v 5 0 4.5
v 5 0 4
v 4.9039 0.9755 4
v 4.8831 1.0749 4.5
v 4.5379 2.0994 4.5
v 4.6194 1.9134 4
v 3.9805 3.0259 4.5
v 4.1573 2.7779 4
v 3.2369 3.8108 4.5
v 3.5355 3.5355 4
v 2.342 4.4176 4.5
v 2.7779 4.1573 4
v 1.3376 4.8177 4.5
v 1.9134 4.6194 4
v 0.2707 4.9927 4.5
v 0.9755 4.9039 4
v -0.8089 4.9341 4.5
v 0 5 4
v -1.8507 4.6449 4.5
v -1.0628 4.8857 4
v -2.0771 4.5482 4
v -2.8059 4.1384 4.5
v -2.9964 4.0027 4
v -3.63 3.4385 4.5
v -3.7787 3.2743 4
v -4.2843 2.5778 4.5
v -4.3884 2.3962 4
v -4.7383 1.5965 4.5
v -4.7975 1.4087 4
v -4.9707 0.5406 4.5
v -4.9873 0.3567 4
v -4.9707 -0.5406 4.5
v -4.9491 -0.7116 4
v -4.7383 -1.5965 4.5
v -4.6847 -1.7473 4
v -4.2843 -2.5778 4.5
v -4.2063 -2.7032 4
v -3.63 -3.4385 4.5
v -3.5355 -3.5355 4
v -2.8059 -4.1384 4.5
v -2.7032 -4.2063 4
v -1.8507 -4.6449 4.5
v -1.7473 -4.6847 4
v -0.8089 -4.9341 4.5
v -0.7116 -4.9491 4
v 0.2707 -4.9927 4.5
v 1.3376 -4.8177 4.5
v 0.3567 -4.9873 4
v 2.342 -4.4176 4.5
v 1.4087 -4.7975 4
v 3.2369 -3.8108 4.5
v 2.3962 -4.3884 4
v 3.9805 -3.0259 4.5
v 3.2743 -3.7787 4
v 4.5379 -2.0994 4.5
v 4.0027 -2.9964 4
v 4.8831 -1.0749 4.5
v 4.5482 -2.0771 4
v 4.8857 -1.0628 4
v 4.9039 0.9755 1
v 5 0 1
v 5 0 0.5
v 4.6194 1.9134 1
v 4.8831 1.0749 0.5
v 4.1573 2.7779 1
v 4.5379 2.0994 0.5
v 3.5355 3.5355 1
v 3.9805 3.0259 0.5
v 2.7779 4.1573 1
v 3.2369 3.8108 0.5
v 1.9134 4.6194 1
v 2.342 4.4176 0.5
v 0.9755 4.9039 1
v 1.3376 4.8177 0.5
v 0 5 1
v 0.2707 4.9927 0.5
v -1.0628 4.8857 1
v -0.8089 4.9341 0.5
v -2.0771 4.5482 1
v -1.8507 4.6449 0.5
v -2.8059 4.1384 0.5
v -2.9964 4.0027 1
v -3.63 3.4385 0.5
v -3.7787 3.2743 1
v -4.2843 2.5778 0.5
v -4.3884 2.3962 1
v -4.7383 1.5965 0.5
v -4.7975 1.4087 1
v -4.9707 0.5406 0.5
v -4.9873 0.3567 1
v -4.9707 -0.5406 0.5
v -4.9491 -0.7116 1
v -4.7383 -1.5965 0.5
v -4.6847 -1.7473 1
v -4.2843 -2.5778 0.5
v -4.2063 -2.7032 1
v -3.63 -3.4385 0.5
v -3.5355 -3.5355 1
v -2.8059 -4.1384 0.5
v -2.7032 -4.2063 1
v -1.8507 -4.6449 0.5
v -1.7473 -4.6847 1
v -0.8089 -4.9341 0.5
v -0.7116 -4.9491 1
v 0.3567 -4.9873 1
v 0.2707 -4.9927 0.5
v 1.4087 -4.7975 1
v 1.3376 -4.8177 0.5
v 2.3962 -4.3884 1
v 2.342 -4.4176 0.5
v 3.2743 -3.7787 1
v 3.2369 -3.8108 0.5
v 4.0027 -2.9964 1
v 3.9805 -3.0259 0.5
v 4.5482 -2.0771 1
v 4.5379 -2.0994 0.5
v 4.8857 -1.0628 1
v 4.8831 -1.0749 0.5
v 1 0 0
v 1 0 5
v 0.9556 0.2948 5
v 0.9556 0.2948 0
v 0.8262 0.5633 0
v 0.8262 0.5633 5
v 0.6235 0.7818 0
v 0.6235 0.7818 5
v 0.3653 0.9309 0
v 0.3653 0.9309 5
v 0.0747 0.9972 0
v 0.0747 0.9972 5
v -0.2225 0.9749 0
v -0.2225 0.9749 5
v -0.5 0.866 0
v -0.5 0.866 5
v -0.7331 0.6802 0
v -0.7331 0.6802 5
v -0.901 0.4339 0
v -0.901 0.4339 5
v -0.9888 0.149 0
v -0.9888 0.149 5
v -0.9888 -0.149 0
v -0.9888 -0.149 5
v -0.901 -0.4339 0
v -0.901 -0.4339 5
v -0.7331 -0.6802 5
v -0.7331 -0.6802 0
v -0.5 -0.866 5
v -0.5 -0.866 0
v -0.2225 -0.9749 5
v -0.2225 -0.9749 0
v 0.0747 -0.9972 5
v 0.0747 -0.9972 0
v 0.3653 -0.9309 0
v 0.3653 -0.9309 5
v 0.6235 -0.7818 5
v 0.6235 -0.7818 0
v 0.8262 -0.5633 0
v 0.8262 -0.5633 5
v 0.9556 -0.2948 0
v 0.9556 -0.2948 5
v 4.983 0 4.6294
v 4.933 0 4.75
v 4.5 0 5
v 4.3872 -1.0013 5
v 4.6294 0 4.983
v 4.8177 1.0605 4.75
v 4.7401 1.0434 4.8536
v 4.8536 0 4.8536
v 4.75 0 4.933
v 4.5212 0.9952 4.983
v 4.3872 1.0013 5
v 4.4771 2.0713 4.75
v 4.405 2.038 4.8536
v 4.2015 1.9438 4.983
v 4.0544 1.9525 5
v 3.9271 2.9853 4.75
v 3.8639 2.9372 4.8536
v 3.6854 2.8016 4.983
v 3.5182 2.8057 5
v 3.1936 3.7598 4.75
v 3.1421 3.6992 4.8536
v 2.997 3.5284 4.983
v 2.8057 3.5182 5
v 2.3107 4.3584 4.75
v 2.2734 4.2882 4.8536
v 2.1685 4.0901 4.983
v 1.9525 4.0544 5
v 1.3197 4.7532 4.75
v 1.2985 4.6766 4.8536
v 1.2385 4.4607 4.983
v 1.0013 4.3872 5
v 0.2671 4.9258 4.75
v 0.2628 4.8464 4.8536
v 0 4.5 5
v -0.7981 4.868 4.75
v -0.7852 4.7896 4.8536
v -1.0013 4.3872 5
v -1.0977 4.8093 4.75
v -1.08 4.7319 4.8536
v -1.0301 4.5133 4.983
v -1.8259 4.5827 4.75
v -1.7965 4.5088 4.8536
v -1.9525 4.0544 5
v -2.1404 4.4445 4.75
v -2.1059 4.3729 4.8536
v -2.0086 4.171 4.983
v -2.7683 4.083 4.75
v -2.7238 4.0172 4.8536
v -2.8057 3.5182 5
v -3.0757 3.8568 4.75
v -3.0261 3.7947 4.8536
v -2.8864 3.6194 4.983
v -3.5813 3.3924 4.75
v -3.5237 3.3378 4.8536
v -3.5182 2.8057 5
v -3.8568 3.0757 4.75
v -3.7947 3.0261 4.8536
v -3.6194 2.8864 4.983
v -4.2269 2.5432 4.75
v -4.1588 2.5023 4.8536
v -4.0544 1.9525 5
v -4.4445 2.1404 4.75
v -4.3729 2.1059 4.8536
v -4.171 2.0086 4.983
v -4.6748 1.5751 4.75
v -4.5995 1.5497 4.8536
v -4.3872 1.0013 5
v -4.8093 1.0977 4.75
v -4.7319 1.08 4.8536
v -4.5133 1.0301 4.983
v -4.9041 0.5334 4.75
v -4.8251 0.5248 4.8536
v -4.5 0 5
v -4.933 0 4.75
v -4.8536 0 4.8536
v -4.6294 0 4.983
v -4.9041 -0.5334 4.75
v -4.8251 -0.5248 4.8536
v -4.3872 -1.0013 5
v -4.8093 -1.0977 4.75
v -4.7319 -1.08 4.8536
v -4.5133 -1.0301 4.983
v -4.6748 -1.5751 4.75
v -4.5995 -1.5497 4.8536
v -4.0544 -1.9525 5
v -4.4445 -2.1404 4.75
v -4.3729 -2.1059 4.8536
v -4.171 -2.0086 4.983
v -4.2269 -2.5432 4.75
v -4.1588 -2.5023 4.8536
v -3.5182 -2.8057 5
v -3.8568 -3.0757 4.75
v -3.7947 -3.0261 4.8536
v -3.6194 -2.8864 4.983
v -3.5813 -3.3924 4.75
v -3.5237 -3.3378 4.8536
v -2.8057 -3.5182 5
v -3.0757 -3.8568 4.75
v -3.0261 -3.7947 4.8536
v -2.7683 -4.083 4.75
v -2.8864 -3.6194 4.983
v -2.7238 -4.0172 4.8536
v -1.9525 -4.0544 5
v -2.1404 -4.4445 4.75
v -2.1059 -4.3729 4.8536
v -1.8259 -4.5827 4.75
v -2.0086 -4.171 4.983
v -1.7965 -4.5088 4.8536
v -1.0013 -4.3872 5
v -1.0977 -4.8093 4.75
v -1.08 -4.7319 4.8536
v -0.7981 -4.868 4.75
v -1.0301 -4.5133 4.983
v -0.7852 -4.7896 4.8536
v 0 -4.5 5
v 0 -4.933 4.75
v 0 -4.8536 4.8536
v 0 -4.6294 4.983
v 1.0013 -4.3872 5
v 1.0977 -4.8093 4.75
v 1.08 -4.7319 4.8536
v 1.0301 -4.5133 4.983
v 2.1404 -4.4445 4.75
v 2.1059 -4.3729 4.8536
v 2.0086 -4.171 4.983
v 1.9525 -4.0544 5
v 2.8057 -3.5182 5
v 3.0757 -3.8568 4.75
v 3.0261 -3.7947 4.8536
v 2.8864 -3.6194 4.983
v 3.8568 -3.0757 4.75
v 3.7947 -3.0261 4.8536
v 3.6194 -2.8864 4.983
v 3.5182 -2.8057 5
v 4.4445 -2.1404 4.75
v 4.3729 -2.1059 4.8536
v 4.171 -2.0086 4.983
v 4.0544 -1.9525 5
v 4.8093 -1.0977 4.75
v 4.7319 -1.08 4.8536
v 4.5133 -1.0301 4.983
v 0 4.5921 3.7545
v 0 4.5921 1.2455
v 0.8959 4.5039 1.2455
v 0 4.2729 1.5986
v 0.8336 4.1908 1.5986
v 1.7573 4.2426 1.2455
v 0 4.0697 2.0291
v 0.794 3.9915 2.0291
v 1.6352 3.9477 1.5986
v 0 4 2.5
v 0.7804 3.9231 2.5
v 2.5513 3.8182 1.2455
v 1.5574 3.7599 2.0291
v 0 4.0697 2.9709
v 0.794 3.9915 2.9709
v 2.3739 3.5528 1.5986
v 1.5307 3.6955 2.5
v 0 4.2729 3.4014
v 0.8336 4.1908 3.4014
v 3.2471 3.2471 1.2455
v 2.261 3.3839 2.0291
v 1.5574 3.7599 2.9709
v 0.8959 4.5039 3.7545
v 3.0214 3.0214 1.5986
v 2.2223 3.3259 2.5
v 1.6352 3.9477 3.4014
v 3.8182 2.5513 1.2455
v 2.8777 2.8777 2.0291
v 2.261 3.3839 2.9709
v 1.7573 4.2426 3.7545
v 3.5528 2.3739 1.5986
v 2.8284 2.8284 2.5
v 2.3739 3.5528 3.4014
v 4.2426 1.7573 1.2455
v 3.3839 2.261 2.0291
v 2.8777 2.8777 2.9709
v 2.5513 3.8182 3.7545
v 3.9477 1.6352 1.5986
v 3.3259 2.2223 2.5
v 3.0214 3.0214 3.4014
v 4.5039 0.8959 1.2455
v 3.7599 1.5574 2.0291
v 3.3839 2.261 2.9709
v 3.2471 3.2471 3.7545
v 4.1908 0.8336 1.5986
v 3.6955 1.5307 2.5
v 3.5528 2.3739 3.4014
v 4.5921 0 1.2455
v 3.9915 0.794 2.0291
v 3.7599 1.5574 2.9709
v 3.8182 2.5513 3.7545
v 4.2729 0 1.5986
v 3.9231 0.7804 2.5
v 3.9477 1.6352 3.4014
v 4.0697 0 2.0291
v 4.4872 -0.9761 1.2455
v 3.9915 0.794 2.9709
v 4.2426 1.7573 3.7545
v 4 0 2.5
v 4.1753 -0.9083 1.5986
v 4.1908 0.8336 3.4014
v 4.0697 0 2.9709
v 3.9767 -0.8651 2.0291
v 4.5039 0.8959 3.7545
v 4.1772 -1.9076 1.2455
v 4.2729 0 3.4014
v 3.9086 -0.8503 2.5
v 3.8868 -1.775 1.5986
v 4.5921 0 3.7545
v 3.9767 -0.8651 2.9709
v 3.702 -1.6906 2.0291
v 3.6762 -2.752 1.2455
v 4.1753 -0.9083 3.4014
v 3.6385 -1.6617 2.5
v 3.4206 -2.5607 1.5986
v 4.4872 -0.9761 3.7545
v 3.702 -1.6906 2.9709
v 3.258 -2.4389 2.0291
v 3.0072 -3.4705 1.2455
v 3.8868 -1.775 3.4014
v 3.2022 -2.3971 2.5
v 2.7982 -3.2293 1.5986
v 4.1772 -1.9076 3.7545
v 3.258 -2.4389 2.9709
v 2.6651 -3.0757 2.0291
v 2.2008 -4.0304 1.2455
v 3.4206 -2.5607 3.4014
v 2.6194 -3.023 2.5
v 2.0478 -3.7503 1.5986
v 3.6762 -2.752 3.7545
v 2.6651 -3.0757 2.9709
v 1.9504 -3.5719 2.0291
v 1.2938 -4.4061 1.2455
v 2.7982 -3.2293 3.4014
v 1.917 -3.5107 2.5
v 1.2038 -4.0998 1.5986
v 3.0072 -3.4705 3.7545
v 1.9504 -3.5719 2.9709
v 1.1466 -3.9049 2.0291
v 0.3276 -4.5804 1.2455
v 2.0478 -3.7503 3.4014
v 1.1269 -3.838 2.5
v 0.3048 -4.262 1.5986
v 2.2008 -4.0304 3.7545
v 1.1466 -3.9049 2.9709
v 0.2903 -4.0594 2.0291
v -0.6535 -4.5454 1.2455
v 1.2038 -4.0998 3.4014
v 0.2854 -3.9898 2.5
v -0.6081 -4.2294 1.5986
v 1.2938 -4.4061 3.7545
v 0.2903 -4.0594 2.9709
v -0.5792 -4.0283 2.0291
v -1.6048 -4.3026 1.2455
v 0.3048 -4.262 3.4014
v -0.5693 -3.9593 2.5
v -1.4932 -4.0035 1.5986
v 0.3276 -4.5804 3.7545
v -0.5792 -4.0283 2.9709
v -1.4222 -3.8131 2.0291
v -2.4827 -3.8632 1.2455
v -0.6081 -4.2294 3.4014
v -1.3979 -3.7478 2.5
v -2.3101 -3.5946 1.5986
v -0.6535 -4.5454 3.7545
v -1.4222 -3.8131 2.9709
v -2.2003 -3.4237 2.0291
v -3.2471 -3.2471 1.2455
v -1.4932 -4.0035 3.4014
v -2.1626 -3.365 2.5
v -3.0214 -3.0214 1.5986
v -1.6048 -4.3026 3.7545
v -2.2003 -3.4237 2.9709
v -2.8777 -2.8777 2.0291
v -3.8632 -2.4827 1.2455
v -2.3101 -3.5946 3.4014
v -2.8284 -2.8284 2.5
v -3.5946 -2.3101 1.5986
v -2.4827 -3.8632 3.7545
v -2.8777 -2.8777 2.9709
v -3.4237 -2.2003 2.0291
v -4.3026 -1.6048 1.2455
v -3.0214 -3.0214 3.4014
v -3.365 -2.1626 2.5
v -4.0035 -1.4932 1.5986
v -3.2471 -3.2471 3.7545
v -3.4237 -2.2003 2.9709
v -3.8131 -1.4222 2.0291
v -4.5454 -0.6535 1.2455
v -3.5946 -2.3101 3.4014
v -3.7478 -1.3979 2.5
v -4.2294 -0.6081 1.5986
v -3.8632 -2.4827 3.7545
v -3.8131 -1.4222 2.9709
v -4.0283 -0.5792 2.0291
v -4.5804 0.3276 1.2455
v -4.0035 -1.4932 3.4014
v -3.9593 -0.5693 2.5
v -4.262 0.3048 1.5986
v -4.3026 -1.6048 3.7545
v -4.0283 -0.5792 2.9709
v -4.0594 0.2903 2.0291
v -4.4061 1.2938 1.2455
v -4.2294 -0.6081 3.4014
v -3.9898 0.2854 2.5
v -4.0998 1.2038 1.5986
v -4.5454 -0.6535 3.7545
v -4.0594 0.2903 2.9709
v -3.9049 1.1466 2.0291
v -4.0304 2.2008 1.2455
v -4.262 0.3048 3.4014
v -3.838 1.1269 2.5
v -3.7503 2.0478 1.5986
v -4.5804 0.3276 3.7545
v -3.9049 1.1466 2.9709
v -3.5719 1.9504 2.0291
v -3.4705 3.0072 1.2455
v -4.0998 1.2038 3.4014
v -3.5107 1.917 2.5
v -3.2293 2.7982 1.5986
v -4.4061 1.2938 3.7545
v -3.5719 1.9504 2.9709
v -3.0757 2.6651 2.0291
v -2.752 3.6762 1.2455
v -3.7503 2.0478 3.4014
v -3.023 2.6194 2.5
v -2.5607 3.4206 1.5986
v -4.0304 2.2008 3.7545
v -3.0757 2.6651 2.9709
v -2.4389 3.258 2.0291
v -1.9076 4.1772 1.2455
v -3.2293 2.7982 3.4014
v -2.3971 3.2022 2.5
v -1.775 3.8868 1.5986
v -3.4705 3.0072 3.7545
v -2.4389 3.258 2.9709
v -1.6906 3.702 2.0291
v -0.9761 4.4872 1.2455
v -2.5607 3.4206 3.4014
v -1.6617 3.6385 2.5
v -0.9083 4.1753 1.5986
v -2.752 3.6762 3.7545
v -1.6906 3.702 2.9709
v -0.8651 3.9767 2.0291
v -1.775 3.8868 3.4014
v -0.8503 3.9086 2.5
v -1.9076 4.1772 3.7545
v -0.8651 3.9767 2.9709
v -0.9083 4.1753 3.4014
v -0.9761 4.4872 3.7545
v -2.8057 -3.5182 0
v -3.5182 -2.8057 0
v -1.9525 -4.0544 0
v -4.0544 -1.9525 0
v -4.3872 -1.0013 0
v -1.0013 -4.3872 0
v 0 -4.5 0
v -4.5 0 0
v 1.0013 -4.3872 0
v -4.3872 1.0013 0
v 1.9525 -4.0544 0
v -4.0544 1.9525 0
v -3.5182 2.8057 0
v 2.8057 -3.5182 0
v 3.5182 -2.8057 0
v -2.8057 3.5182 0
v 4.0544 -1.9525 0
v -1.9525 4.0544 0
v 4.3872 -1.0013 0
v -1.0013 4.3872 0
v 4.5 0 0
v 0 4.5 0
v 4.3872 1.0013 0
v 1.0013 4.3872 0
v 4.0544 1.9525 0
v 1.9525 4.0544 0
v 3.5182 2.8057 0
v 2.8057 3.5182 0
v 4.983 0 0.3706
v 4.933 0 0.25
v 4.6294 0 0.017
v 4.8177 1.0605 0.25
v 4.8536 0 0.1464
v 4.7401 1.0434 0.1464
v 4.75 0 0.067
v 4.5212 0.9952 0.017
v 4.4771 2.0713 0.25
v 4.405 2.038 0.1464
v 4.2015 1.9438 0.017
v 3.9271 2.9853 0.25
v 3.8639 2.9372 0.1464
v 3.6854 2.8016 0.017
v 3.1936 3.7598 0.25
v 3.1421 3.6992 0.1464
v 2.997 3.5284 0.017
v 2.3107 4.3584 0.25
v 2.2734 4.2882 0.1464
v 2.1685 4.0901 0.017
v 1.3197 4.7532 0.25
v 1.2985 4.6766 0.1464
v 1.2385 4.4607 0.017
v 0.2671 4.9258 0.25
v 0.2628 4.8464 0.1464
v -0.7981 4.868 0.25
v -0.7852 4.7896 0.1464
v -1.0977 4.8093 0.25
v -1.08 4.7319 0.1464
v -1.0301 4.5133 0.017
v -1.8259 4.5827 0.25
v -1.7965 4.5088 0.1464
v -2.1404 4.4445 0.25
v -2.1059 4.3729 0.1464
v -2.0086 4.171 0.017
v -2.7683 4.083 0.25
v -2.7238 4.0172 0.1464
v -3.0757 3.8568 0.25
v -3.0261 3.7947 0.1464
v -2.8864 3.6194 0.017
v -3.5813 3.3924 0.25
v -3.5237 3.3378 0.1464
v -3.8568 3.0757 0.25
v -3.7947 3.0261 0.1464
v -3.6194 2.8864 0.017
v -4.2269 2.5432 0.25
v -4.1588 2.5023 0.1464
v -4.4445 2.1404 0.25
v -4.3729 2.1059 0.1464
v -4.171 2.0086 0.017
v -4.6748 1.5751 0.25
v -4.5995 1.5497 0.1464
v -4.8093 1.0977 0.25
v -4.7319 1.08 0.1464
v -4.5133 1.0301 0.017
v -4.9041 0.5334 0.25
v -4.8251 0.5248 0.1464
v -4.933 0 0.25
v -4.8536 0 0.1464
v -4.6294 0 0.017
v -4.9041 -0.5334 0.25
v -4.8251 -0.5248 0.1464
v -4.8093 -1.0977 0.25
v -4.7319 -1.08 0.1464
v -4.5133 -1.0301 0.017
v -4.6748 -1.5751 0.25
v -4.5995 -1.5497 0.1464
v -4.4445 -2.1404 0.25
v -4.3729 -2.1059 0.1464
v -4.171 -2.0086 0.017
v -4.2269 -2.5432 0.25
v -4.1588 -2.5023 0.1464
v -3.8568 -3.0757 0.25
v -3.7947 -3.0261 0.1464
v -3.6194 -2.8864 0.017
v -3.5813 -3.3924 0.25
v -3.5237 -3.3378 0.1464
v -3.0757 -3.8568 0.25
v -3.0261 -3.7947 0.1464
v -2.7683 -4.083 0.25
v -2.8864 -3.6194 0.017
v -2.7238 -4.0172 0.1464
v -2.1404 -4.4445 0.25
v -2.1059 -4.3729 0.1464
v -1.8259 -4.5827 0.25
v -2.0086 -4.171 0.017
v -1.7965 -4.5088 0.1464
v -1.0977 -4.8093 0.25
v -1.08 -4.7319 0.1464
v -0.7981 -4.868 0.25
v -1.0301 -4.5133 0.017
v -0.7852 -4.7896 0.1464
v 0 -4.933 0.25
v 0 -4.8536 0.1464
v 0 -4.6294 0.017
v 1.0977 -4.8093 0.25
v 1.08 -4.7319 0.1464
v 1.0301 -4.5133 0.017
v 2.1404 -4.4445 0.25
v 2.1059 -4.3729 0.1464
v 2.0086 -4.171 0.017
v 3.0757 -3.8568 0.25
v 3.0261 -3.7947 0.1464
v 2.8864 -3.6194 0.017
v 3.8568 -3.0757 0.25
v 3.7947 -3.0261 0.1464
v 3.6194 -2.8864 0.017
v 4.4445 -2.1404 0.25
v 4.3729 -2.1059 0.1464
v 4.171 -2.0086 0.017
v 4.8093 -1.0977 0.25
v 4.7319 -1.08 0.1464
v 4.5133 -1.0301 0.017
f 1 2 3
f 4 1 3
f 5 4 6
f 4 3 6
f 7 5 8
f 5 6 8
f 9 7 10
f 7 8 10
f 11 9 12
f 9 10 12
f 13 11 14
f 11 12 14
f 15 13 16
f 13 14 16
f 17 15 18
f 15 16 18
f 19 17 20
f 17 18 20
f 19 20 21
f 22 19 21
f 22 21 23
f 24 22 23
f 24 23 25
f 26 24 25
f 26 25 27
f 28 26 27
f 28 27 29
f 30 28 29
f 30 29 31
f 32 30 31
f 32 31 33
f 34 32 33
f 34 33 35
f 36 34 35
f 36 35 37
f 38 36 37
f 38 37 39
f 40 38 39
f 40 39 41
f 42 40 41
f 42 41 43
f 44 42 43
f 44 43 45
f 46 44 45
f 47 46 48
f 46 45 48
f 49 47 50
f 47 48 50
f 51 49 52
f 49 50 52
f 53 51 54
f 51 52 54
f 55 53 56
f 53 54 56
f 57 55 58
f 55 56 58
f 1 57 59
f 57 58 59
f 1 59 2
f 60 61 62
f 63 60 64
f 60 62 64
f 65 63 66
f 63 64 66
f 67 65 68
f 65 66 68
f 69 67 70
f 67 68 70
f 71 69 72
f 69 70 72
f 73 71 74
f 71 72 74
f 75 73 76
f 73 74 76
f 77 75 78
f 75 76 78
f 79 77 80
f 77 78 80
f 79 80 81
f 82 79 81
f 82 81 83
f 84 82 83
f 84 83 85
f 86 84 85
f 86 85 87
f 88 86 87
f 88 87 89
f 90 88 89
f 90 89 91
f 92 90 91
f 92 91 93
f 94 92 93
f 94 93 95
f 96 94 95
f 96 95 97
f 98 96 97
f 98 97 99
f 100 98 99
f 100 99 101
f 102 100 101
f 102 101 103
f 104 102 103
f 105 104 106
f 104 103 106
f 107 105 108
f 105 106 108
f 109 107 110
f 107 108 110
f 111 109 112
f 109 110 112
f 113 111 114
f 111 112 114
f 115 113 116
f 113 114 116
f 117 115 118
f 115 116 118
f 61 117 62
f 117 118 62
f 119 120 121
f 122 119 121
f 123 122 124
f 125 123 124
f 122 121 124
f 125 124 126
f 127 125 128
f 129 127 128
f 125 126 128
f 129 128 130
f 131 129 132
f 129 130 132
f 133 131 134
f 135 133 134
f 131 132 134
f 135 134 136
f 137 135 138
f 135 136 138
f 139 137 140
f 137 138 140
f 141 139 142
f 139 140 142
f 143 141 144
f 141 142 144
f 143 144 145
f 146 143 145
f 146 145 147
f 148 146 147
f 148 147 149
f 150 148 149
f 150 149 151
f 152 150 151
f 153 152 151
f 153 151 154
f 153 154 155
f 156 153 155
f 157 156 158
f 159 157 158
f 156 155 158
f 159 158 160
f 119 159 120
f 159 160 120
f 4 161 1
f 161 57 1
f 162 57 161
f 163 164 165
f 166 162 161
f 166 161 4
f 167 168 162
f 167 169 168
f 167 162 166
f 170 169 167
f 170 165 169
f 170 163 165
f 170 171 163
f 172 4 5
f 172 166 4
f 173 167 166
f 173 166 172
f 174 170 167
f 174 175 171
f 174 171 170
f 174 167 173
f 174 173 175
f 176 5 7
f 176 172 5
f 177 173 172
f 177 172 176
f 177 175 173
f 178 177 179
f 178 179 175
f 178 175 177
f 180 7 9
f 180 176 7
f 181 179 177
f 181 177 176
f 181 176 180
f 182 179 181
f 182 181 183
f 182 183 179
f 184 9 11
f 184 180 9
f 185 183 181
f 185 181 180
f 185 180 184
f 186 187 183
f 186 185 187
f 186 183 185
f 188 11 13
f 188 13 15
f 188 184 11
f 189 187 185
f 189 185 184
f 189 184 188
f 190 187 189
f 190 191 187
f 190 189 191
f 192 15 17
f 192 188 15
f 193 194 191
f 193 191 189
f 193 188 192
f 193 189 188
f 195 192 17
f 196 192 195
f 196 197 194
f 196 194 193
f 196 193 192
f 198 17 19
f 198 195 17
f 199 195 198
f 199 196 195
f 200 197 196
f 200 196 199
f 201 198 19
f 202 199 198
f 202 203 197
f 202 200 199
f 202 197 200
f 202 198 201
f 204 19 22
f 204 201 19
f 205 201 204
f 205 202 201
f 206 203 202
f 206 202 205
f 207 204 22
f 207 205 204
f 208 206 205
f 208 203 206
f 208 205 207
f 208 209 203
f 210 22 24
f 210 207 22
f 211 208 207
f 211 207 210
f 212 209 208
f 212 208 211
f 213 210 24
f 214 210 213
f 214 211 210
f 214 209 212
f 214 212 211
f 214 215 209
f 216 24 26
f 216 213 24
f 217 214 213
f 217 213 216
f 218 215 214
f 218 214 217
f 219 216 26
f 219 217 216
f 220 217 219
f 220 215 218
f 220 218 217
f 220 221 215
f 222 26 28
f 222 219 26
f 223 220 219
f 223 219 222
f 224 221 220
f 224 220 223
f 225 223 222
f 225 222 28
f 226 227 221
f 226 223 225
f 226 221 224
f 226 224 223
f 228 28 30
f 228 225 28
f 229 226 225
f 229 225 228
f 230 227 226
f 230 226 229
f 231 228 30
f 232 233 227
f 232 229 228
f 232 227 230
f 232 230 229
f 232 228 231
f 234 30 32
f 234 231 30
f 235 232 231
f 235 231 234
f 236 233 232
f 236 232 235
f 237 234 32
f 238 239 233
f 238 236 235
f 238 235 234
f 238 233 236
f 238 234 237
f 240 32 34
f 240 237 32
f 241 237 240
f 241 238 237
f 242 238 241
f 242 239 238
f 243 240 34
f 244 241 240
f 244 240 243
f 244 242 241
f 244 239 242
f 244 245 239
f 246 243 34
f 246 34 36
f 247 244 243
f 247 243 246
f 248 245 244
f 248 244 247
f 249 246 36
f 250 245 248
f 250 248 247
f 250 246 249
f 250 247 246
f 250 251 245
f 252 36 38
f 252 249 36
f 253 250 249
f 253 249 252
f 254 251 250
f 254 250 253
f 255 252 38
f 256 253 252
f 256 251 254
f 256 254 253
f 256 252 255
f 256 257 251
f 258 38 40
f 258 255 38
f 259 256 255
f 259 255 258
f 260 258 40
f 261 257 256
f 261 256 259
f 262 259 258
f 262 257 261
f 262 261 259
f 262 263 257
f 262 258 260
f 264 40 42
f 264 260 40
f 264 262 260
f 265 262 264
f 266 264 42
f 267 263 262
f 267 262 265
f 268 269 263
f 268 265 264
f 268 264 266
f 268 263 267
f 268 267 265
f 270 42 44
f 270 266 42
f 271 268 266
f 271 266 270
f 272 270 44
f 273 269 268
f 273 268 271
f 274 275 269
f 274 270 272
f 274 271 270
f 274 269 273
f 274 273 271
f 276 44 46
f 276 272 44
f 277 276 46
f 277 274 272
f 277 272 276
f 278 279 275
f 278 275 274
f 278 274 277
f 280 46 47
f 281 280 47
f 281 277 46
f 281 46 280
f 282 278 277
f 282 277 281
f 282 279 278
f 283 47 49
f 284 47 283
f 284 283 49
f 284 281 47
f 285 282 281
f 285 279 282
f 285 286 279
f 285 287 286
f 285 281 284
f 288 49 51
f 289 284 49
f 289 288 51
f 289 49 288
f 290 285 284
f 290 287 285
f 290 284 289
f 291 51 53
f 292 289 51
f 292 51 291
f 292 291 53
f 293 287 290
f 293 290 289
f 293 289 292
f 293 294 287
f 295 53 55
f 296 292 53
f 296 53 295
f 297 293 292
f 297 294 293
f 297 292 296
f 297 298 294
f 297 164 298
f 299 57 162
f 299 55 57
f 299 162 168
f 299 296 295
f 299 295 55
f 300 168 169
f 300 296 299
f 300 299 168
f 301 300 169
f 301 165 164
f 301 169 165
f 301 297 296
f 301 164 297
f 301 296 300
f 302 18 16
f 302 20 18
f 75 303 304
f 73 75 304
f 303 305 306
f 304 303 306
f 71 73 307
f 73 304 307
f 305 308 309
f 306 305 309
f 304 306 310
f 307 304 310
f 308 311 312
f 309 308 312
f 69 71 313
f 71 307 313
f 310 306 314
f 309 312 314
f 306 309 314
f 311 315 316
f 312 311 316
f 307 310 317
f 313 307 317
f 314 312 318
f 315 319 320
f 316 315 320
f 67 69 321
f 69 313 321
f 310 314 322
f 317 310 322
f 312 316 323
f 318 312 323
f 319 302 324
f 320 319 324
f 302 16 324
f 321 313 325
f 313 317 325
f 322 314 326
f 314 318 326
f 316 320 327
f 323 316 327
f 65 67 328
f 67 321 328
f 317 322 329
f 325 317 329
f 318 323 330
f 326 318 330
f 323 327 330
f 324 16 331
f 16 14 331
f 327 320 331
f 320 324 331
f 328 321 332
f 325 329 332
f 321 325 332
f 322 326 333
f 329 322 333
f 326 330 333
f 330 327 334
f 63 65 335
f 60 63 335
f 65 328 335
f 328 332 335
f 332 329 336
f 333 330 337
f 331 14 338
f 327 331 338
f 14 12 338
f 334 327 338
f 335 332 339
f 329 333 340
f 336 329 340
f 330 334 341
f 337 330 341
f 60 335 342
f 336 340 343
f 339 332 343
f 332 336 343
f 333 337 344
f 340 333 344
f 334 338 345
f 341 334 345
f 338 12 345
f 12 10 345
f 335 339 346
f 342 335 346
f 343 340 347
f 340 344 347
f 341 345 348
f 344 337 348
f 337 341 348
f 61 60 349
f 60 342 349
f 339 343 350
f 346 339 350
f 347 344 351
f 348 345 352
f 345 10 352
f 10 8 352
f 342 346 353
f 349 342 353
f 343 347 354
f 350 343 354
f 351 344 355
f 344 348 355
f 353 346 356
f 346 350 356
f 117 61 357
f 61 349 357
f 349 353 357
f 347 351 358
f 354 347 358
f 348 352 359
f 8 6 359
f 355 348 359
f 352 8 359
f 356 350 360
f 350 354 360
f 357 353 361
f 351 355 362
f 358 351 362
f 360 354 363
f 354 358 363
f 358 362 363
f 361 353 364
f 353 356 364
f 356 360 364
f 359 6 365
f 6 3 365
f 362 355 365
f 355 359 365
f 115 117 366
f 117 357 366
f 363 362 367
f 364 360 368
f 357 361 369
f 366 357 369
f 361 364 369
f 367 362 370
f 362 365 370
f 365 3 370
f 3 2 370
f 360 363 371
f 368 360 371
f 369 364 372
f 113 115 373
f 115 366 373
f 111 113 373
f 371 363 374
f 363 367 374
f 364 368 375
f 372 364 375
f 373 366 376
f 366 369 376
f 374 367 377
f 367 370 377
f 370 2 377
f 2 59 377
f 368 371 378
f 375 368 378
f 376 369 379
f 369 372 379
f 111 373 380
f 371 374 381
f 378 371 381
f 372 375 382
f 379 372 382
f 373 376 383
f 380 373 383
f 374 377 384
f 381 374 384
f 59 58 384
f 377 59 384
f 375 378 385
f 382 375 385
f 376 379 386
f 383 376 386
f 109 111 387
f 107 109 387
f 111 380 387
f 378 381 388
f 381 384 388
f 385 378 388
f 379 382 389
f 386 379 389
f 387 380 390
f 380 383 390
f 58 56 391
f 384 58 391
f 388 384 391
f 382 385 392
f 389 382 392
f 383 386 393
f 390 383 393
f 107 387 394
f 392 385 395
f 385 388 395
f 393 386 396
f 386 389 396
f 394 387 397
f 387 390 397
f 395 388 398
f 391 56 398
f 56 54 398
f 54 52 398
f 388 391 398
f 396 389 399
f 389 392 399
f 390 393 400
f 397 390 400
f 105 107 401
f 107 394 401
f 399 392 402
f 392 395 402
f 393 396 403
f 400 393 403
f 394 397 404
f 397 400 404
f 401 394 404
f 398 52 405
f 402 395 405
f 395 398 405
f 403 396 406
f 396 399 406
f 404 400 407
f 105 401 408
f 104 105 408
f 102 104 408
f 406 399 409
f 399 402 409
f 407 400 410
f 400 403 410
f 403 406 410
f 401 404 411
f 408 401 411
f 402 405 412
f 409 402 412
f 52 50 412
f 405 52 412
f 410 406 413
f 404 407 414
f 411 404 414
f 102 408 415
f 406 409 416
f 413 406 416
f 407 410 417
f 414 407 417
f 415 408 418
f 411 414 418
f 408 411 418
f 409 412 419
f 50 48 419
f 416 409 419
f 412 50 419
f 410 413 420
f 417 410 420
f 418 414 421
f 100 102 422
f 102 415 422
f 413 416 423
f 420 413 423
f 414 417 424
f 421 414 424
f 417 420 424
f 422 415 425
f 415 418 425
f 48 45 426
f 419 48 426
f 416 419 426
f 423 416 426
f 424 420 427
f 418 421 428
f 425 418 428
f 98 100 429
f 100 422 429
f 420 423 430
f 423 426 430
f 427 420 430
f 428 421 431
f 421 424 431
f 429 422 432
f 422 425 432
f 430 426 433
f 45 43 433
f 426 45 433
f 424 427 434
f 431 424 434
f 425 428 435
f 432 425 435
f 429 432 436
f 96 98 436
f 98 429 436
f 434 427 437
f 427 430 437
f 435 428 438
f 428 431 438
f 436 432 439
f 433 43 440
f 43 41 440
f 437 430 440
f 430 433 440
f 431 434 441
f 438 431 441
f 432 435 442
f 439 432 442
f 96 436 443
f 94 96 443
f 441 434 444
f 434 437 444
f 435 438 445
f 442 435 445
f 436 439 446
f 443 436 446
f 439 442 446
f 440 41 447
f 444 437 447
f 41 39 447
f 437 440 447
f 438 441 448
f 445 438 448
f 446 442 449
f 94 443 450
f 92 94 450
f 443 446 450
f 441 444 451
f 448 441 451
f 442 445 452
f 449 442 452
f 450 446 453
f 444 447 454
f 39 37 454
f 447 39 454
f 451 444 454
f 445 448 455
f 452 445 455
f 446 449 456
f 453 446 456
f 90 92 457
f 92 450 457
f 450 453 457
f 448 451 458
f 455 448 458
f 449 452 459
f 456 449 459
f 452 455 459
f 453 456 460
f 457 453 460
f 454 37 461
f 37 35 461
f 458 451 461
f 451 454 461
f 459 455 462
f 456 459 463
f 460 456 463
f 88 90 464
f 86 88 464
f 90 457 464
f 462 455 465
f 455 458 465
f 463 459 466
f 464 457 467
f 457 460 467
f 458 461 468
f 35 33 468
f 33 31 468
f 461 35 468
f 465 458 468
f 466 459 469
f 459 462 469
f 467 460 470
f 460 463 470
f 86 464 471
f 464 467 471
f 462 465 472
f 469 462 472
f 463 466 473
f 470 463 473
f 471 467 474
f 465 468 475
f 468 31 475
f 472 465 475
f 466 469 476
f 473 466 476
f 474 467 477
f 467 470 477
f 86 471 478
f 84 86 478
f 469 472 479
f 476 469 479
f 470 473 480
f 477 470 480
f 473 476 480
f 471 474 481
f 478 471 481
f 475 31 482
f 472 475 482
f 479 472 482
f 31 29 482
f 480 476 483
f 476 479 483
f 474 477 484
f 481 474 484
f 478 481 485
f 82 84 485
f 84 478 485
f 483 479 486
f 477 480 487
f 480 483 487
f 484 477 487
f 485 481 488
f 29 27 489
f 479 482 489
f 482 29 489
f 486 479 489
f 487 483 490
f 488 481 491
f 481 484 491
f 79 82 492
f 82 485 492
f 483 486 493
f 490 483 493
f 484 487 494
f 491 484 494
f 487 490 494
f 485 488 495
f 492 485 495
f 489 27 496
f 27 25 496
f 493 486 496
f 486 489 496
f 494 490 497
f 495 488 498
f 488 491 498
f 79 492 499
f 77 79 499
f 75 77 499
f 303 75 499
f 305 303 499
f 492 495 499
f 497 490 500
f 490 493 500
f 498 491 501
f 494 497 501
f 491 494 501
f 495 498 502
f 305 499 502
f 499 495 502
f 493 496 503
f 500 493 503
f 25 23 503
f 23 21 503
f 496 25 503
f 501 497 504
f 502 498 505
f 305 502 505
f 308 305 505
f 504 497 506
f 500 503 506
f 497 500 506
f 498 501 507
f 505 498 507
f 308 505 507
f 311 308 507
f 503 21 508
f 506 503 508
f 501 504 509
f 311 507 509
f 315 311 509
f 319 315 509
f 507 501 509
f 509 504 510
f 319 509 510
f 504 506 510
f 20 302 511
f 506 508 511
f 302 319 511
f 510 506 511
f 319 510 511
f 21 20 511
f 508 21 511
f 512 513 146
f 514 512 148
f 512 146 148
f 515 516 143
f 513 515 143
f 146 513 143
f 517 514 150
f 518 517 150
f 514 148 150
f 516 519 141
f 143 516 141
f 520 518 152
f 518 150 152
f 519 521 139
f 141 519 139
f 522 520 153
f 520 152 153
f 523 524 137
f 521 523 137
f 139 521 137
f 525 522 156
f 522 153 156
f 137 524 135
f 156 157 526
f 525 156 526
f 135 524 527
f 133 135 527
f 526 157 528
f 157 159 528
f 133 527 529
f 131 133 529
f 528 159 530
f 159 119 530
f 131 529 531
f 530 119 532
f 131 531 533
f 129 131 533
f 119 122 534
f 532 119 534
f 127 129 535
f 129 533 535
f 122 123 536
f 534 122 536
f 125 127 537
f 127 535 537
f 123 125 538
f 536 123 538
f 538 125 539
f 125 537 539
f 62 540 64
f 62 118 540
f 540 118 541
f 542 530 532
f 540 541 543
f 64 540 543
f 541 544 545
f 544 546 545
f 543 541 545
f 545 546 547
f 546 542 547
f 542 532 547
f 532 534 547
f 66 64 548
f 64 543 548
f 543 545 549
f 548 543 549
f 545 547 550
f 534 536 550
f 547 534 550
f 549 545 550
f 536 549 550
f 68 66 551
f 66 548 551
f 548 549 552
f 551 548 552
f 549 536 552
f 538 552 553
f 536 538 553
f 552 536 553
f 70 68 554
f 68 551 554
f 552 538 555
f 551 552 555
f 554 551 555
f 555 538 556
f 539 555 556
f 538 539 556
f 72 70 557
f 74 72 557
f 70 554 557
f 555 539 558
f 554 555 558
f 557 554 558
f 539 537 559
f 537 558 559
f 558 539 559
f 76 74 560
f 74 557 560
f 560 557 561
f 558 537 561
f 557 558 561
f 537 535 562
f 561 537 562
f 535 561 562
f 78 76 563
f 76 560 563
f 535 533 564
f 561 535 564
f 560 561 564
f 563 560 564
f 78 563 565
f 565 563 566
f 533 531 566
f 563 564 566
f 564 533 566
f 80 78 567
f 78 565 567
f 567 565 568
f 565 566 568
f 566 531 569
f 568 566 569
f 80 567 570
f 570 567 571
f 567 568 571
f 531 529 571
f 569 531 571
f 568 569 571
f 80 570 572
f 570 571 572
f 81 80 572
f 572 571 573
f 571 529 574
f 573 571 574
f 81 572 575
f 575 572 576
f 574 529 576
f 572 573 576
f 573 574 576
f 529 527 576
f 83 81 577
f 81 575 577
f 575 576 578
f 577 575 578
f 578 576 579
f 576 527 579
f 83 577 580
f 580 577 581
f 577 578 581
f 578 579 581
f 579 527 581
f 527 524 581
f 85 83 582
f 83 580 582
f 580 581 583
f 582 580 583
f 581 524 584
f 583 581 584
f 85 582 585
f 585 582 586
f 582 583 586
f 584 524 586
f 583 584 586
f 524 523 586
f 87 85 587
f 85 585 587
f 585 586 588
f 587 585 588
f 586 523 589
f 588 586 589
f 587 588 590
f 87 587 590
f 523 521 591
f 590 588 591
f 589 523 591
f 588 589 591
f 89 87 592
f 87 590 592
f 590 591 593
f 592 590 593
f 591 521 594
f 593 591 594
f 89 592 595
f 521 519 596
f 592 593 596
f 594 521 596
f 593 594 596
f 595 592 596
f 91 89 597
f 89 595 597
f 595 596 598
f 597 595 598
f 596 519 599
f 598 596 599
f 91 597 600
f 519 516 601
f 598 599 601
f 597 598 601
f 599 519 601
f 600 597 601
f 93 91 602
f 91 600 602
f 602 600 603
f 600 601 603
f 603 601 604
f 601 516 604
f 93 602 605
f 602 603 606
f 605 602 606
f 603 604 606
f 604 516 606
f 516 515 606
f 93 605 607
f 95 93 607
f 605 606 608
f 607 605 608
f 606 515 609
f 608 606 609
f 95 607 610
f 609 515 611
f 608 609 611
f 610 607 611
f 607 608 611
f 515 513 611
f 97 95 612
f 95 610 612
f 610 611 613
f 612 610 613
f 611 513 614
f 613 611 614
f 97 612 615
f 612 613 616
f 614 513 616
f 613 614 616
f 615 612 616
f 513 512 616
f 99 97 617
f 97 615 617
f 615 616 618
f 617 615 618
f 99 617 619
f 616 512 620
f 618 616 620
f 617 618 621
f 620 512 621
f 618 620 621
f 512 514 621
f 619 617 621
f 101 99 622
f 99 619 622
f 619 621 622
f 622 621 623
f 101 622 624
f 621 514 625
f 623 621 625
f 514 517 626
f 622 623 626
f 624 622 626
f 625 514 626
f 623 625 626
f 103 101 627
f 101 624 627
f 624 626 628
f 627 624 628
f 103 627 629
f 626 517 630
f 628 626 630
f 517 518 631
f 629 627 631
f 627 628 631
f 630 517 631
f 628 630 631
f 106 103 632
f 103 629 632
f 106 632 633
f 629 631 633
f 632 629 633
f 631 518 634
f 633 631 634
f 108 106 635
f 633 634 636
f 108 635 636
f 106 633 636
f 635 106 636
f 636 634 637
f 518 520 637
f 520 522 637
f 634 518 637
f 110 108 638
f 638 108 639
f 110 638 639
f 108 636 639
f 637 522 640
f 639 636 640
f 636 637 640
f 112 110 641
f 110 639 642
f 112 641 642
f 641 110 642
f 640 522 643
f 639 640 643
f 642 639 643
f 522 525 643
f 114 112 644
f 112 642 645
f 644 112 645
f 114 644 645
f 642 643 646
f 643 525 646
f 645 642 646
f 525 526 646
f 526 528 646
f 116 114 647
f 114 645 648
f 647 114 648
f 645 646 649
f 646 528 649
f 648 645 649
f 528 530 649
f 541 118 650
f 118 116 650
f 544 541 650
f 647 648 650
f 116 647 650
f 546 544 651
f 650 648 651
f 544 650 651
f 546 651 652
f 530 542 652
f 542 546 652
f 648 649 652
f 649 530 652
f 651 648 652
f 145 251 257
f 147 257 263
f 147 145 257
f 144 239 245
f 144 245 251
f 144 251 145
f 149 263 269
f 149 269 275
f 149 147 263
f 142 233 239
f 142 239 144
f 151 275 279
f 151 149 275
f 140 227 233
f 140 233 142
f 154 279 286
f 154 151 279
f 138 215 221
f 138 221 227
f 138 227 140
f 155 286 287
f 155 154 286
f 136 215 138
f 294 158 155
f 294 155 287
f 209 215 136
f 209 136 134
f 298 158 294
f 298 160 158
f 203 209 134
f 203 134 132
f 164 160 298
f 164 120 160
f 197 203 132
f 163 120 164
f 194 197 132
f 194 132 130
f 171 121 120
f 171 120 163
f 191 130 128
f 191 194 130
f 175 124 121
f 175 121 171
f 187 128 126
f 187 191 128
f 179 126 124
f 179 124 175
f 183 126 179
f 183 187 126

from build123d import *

# Parameters (mm, degrees)
SKETCH1_R           = 5
BOSS_EXTRUDE1_DEPTH = 5
FILLET1_R           = 0.5
SKETCH4_R           = 1
CUT_EXTRUDE1_DEPTH  = 5


with BuildPart() as part:
    # Sketch1 → Boss-Extrude1 (new body)
    with BuildSketch(Plane.XY):
        Circle(SKETCH1_R)
    extrude(amount=BOSS_EXTRUDE1_DEPTH)

    # Sketch2 → Cut-Revolve1 (revolve, cut)
    with BuildSketch(Plane(origin=(0, 0, 0), x_dir=(0, 0, -1), z_dir=(1, 0, 0))):
        with BuildLine():
            Line((-4, 5), (-1, 5))
            ThreePointArc((-1, 5), (-2.5, 4), (-4, 5))
        make_face()
    revolve(axis=Axis((0, 0, 5.25), (0, 0, -1)), mode=Mode.SUBTRACT)

    # Fillet1
    fillet1_edges = [part.edges().sort_by_distance(p)[0] for p in [
        (-5, 0, 0),
        (-5, 0, 5),
    ]]
    fillet(fillet1_edges, radius=FILLET1_R)

    # Sketch4 → Cut-Extrude1 (cut)
    with BuildSketch(Plane.XY.offset(5)):
        Circle(SKETCH4_R)
    extrude(amount=-CUT_EXTRUDE1_DEPTH, mode=Mode.SUBTRACT)


solid = part.part
